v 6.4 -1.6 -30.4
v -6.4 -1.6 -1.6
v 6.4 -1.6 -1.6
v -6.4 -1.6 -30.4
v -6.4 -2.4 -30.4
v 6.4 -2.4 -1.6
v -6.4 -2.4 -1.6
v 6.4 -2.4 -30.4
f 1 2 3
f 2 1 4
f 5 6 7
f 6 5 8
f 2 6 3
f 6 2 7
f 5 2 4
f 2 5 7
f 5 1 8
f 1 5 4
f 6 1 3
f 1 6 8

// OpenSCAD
// file: ../p/box.scad
use <../lib.scad>
function ldraw_lib__box() = [
// 0 Box 6 (six faces)
// 0 Name: box.dat
// 0 Author: James Jessiman
// 0 !LDRAW_ORG Primitive UPDATE 2002-05
// 0 !LICENSE Licensed under CC BY 2.0 and CC BY 4.0 : see CAreadme.txt
// 
// 0 BFC CERTIFY CCW
  [0,"BFC","CERTIFY"],
  [0,"BFC","CCW"],
// 
// 0 !HISTORY 2002-08-22 [sbliss] Applied BFC
// 0 !HISTORY 2002-11-30 [PTadmin] Official Update 2002-05
// 0 !HISTORY 2007-06-24 [PTadmin] Header formatted for Contributor Agreement
// 0 !HISTORY 2008-07-01 [PTadmin] Official Update 2008-01
// 
// 
// 2 24 1 1 1 -1 1 1
  [2,24,1,1,1,-1,1,1],
// 2 24 -1 1 1 -1 1 -1
  [2,24,-1,1,1,-1,1,-1],
// 2 24 -1 1 -1 1 1 -1
  [2,24,-1,1,-1,1,1,-1],
// 2 24 1 1 -1 1 1 1
  [2,24,1,1,-1,1,1,1],
// 2 24 1 -1 1 -1 -1 1
  [2,24,1,-1,1,-1,-1,1],
// 2 24 -1 -1 1 -1 -1 -1
  [2,24,-1,-1,1,-1,-1,-1],
// 2 24 -1 -1 -1 1 -1 -1
  [2,24,-1,-1,-1,1,-1,-1],
// 2 24 1 -1 -1 1 -1 1
  [2,24,1,-1,-1,1,-1,1],
// 2 24 1 -1 1 1 1 1
  [2,24,1,-1,1,1,1,1],
// 2 24 -1 -1 1 -1 1 1
  [2,24,-1,-1,1,-1,1,1],
// 2 24 1 -1 -1 1 1 -1
  [2,24,1,-1,-1,1,1,-1],
// 2 24 -1 -1 -1 -1 1 -1
  [2,24,-1,-1,-1,-1,1,-1],
// 4 16 1 1 1 1 1 -1 -1 1 -1 -1 1 1
  [4,16,1,1,1,1,1,-1,-1,1,-1,-1,1,1],
// 4 16 -1 -1 -1 1 -1 -1 1 -1 1 -1 -1 1
  [4,16,-1,-1,-1,1,-1,-1,1,-1,1,-1,-1,1],
// 4 16 -1 -1 1 1 -1 1 1 1 1 -1 1 1
  [4,16,-1,-1,1,1,-1,1,1,1,1,-1,1,1],
// 4 16 -1 -1 -1 -1 -1 1 -1 1 1 -1 1 -1
  [4,16,-1,-1,-1,-1,-1,1,-1,1,1,-1,1,-1],
// 4 16 1 -1 -1 -1 -1 -1 -1 1 -1 1 1 -1
  [4,16,1,-1,-1,-1,-1,-1,-1,1,-1,1,1,-1],
// 4 16 1 -1 1 1 -1 -1 1 1 -1 1 1 1
  [4,16,1,-1,1,1,-1,-1,1,1,-1,1,1,1],
// 0
];
makepoly(ldraw_lib__box(), line=0.2);
// main file
use <../lib.scad>
use <../p/box.scad>
function ldraw_lib__u8035() = [
// 0 ~Mursten Glass for Door  1 x  2 x  4
// 0 Name: u8035.dat
// 0 Author: J.C. Tchang [tchang]
// 0 !LDRAW_ORG Part UPDATE 2019-02
// 0 !LICENSE Licensed under CC BY 2.0 and CC BY 4.0 : see CAreadme.txt
// 
// 0 BFC CERTIFY CCW
  [0,"BFC","CERTIFY"],
  [0,"BFC","CCW"],
// 
// 0 !CATEGORY Door
// 0 !KEYWORDS Automatic Binding Brick
// 
// 0 !CMDLINE -c47
// 
// 0 !HISTORY 2019-06-03 [Holly-Wood] Inverted BFC, substituted prims, adjusted position, separated glass in separate file
// 0 !HISTORY 2019-09-09 [PTadmin] Official Update 2019-02
// 
// 
// 1 16 0 40 -5 16 0 0 0 0 -36 0 1 0 box.dat
  [1,16,0,40,-5,16,0,0,0,0,-36,0,1,0, ldraw_lib__box()],
];
makepoly(ldraw_lib__u8035(), line=0.2);
